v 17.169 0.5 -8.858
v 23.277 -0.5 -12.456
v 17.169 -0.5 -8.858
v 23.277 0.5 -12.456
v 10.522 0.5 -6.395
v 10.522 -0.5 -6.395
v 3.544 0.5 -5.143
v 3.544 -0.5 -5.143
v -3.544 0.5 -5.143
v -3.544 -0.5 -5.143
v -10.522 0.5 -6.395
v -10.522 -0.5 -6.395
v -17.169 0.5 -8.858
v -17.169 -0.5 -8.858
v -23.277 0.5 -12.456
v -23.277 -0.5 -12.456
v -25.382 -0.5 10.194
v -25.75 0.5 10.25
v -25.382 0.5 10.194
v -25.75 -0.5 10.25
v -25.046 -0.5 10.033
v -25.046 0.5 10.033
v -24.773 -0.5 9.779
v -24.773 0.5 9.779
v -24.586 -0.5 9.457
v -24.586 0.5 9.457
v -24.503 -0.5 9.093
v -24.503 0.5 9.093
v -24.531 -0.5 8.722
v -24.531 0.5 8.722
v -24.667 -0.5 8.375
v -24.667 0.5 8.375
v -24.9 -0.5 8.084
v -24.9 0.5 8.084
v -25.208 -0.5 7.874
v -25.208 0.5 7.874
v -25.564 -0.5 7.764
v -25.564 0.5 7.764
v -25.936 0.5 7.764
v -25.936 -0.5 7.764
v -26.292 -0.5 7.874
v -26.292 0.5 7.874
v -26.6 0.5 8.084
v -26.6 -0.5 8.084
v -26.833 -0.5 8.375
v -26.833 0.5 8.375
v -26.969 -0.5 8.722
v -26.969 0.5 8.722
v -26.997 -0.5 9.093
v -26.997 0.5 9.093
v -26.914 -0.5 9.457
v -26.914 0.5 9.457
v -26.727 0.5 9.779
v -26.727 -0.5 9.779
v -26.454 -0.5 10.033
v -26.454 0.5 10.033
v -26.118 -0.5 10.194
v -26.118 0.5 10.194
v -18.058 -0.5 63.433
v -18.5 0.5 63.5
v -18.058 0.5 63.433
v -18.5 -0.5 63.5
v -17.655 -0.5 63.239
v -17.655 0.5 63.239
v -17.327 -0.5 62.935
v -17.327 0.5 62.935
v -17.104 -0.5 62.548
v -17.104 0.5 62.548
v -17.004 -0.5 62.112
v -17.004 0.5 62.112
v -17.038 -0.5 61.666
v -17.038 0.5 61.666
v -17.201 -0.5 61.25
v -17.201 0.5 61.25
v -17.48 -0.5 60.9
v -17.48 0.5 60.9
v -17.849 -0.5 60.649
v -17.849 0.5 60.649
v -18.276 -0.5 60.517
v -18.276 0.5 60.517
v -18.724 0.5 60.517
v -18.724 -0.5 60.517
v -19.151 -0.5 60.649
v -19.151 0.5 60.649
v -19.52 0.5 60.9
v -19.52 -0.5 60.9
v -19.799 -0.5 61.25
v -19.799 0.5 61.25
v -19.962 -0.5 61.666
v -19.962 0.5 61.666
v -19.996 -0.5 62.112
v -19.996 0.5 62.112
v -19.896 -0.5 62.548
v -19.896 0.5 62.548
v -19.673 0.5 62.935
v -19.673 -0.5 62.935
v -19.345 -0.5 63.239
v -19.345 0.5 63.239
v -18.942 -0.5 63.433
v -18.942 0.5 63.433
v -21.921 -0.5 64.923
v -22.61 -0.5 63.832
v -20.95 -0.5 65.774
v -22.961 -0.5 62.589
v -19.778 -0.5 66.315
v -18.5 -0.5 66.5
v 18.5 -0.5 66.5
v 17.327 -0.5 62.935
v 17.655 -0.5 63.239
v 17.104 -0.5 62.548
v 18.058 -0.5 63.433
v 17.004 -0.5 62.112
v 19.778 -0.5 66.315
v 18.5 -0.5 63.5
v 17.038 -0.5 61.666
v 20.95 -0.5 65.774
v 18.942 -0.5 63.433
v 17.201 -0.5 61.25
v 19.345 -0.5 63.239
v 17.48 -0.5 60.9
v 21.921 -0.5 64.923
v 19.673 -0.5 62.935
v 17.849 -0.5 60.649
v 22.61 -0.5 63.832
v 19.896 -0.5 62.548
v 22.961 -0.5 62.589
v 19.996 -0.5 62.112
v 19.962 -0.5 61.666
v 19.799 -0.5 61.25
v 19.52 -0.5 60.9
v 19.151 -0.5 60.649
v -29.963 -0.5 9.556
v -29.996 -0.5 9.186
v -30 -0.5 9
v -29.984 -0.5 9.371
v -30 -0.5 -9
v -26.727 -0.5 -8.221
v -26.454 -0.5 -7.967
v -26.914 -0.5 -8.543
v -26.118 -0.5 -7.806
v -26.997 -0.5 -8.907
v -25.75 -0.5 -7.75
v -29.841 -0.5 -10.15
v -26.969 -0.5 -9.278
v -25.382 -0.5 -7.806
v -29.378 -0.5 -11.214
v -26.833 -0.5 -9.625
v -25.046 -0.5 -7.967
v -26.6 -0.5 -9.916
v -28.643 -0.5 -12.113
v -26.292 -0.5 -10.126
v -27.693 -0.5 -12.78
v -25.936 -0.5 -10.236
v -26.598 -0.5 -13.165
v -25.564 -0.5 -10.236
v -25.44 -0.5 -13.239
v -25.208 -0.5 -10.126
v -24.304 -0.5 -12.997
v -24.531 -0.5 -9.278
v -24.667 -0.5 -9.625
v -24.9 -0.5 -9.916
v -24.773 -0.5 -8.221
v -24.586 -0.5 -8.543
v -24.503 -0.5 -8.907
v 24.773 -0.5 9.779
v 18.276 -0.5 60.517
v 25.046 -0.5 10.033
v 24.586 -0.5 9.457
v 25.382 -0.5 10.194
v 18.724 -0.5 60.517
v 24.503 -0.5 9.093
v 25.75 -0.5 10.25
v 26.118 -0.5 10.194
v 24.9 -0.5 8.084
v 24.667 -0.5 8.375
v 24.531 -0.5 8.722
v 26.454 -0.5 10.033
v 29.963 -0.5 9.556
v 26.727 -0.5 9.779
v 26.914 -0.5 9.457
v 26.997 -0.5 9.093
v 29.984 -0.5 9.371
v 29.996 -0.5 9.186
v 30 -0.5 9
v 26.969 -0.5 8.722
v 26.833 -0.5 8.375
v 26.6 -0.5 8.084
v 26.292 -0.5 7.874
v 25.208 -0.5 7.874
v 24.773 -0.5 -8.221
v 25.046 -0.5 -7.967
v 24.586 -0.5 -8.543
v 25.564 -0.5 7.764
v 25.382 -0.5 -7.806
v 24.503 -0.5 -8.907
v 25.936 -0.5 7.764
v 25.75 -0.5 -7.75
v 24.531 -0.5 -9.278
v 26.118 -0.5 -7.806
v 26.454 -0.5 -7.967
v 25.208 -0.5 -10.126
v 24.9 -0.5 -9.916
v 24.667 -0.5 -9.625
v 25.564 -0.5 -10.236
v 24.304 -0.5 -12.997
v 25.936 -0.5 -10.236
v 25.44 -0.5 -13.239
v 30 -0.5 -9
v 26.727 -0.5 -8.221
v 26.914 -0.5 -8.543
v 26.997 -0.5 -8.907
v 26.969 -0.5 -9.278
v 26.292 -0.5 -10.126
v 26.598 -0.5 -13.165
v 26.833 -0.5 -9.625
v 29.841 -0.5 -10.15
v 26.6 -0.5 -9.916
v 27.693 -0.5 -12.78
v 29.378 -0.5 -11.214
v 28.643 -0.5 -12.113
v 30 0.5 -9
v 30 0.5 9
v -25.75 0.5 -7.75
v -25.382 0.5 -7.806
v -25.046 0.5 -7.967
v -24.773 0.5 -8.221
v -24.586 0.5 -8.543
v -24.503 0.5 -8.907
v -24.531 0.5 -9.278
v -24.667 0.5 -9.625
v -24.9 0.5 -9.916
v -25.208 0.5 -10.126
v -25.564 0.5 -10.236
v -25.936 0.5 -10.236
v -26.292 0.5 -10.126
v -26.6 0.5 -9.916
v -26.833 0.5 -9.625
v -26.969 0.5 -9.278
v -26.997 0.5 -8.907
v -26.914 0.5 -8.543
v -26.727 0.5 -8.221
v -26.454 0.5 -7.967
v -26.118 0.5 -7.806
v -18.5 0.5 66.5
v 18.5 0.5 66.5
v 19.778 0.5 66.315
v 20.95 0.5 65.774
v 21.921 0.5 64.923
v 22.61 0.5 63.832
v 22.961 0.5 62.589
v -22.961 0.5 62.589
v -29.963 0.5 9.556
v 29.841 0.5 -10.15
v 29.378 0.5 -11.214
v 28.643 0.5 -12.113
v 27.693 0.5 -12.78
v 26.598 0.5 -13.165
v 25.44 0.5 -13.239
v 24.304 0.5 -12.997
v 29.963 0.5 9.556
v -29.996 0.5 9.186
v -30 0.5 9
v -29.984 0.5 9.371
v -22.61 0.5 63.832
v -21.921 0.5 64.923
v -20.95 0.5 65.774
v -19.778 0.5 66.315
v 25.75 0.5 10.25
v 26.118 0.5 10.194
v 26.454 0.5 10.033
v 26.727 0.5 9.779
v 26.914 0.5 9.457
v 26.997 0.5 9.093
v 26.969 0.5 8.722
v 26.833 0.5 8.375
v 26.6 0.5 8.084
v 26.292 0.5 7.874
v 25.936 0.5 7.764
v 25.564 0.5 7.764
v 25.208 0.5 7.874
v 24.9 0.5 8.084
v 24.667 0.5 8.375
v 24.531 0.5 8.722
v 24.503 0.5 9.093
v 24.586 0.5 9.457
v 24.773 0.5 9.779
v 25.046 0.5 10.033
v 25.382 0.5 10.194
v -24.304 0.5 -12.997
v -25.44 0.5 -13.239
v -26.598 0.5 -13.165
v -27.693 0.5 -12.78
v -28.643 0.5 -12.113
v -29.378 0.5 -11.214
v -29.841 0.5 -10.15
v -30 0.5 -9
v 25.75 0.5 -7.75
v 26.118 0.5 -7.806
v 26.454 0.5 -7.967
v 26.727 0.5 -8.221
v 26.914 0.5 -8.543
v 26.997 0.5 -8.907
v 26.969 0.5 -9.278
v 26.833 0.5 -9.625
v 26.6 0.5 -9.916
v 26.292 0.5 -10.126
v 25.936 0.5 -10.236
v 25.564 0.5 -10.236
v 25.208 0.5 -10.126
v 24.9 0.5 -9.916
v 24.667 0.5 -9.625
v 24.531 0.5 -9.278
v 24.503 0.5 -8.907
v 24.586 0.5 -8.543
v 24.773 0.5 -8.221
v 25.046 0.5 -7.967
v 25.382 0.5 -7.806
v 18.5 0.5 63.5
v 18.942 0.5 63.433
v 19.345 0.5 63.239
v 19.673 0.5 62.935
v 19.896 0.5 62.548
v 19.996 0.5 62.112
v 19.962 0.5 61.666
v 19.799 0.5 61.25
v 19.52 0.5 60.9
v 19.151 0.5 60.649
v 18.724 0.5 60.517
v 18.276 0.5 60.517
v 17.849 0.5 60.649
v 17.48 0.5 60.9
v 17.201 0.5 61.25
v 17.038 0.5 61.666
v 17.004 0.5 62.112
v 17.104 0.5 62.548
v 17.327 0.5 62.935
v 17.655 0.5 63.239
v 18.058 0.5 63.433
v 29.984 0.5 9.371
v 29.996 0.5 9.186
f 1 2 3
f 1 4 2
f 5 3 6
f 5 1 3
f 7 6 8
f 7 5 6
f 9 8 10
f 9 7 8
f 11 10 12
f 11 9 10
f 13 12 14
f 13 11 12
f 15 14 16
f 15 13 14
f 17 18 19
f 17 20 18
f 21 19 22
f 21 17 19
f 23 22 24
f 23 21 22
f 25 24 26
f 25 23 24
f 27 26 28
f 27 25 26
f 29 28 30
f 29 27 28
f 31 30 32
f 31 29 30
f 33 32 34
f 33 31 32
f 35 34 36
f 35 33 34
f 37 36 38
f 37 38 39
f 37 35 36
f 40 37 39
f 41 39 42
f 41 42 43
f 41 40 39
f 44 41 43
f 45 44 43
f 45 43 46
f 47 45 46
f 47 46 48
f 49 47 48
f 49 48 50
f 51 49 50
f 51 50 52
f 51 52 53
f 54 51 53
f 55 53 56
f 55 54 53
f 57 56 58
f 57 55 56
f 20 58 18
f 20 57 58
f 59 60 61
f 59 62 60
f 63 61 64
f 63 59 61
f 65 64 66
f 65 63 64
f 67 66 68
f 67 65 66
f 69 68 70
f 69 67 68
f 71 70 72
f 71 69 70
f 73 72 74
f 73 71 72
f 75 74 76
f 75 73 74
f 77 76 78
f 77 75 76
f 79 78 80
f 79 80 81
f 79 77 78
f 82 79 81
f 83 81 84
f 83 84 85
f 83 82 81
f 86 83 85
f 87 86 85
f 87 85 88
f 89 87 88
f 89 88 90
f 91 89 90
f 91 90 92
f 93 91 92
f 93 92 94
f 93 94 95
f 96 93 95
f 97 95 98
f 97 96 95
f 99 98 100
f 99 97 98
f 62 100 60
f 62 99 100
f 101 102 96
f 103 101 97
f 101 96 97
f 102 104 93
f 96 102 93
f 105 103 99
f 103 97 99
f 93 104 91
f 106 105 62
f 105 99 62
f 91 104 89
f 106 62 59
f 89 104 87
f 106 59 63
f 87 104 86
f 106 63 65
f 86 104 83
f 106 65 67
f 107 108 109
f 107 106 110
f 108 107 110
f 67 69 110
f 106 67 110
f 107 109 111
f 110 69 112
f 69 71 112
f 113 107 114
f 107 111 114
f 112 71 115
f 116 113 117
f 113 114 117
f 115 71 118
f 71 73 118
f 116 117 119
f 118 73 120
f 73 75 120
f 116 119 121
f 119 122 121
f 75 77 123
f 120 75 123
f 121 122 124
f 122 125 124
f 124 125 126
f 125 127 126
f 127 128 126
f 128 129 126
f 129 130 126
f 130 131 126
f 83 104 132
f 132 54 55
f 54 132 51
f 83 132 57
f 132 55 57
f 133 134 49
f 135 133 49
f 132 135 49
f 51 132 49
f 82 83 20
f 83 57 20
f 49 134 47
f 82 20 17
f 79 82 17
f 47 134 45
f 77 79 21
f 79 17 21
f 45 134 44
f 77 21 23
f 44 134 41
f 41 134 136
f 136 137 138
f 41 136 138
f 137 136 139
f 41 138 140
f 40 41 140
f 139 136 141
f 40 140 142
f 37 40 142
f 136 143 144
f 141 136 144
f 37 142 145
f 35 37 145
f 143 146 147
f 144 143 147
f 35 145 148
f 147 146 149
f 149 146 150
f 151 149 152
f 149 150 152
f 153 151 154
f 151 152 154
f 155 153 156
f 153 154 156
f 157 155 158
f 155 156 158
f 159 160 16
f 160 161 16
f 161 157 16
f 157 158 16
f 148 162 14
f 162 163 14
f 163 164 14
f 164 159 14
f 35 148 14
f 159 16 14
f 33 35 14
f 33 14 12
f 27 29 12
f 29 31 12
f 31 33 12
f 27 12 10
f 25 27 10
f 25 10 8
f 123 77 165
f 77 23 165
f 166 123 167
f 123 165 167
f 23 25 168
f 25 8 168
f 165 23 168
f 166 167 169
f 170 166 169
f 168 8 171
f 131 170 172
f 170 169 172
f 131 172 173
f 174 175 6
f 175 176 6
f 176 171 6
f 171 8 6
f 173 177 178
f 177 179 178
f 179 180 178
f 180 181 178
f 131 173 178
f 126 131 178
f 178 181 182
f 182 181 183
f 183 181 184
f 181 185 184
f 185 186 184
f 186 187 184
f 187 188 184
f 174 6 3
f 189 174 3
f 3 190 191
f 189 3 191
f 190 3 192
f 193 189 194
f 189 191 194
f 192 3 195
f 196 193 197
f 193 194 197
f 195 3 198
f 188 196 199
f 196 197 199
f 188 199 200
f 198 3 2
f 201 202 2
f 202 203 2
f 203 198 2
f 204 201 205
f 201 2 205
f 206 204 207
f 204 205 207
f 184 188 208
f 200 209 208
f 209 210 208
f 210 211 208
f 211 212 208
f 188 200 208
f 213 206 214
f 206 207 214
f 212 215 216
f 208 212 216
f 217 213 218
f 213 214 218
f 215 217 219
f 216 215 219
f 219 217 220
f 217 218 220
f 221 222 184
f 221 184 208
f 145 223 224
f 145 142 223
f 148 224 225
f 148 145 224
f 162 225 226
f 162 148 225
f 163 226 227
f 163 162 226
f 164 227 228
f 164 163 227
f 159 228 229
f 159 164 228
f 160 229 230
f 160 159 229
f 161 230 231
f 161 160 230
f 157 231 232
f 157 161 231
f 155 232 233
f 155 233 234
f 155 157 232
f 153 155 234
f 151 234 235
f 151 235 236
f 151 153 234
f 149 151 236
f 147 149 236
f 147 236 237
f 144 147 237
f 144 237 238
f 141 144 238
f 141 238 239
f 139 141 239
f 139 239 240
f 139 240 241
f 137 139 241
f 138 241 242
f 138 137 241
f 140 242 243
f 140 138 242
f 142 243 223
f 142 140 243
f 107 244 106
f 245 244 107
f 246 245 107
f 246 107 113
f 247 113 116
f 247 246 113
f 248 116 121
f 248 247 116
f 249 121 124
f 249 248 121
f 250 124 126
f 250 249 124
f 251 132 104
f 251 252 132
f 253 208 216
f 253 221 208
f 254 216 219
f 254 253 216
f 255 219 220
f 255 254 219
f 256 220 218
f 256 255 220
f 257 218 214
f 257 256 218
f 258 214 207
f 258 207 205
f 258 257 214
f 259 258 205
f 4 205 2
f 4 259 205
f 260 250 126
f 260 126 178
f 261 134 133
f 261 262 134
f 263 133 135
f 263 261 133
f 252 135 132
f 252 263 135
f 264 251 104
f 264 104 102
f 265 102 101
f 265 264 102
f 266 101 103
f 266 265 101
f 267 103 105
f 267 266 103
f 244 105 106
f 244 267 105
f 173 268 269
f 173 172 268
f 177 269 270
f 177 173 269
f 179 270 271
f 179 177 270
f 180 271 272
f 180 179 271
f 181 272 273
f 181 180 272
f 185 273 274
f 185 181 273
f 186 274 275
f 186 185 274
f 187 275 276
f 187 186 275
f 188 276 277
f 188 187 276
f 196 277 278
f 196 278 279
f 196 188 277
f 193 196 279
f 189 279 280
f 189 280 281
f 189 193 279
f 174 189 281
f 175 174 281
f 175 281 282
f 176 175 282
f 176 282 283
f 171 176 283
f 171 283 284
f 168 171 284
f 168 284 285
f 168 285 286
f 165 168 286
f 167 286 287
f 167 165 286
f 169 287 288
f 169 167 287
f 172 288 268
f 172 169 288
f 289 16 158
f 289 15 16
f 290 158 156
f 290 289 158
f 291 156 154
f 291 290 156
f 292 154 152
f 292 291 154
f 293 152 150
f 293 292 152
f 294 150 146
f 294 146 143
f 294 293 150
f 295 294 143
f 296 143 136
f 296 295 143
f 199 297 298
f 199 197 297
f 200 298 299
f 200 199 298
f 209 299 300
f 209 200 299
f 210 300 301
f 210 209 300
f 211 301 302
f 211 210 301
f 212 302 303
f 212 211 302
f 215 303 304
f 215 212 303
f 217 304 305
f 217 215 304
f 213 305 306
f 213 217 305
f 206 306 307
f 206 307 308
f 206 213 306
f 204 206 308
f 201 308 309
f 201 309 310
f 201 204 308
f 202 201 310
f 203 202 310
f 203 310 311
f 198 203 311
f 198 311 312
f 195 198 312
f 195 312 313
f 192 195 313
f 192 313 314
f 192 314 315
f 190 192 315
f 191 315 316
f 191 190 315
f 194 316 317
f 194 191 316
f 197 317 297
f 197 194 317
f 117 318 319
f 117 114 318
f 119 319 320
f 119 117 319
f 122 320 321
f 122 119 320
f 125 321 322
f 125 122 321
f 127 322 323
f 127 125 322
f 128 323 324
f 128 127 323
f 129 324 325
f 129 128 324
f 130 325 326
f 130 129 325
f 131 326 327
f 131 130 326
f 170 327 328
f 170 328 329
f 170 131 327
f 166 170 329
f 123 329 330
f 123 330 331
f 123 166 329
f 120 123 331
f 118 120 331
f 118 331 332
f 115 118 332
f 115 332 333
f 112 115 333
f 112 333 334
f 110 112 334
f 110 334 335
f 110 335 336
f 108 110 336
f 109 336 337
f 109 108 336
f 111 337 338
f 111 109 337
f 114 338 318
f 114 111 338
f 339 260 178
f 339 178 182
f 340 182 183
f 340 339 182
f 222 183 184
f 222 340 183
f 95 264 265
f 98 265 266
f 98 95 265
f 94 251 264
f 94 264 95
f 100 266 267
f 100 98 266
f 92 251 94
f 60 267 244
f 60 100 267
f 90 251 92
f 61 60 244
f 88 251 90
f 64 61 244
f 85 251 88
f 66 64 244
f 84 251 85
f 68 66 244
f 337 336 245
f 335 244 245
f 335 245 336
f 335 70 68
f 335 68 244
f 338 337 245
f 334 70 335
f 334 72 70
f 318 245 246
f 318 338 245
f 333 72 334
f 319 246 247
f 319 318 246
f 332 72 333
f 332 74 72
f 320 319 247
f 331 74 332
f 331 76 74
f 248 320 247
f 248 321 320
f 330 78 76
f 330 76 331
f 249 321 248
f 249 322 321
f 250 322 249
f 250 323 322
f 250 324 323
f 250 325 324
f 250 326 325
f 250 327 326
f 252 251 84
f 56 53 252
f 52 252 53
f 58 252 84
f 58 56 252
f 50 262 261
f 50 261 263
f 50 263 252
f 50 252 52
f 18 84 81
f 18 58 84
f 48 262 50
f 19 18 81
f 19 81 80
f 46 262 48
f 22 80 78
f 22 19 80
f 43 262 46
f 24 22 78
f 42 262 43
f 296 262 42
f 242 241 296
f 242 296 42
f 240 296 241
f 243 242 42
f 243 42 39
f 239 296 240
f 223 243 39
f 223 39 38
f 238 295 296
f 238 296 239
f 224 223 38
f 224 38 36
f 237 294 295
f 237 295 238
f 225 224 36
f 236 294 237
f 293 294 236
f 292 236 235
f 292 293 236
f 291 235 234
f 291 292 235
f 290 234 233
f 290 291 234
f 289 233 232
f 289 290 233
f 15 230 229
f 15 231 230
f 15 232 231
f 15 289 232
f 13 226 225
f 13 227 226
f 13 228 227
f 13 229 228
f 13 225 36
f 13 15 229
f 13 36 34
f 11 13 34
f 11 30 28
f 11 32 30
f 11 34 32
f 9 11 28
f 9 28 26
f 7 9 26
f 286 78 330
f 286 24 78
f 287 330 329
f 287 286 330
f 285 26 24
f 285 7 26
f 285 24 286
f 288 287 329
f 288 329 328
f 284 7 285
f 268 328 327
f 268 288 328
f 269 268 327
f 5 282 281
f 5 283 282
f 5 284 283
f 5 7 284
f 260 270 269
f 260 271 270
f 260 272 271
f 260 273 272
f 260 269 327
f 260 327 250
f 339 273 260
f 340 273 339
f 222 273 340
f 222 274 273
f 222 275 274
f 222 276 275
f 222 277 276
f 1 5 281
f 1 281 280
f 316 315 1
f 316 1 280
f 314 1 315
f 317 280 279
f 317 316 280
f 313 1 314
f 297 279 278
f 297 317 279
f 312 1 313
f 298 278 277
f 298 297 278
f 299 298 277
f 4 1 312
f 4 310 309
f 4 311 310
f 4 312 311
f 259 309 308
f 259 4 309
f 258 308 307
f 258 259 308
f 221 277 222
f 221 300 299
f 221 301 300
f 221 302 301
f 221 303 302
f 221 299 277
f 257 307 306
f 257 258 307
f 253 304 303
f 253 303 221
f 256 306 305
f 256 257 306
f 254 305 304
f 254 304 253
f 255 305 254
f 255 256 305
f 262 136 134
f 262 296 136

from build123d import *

# Parameters (mm, degrees)
SKICA1_R                = 1.25
SKICA1_R_2              = 1.5
P_IDAT_VYSUNUT_M1_DEPTH = 0.5


with BuildPart() as part:
    # Skica1 → Přidat vysunutím1 (new, symmetric)
    with BuildSketch(Plane(origin=(0, 0, 0), x_dir=(1, 0, 0), z_dir=(0, 1, 0))):
        with BuildLine():
            Line((-29.963432056, -9.556318536), (-22.961281, -62.589043156))
            ThreePointArc((-22.961281, -62.589043156), (-21.466420891, -65.383836152), (-18.5, -66.5))
            Line((-18.5, -66.5), (18.5, -66.5))
            ThreePointArc((18.5, -66.5), (21.466420891, -65.383836152), (22.961281, -62.589043156))
            Line((22.961281, -62.589043156), (29.963432056, -9.556318536))
            ThreePointArc((29.963432056, -9.556318536), (29.99084816, -9.278759542), (30, -9))
            Line((30, -9), (30, 9))
            ThreePointArc((30, 9), (27.693135825, 12.77977819), (23.276836158, 12.4562929))
            ThreePointArc((23.276836158, 12.4562929), (0, 4.986108431), (-23.276836158, 12.4562929))
            ThreePointArc((-23.276836158, 12.4562929), (-27.693135825, 12.77977819), (-30, 9))
            Line((-30, 9), (-30, -9))
            ThreePointArc((-30, -9), (-29.99084816, -9.278759542), (-29.963432056, -9.556318536))
        make_face()
        with Locations(Location((-25.75, 9, 0), (0, 0, 270))):
            Circle(SKICA1_R, mode=Mode.SUBTRACT)
        with Locations(Location((25.75, 9, 0), (0, 0, 270))):
            Circle(SKICA1_R, mode=Mode.SUBTRACT)
        with Locations(Location((-25.75, -9, 0), (0, 0, 270))):
            Circle(SKICA1_R, mode=Mode.SUBTRACT)
        with Locations(Location((25.75, -9, 0), (0, 0, 270))):
            Circle(SKICA1_R, mode=Mode.SUBTRACT)
        with Locations(Location((-18.5, -62, 0), (0, 0, 270))):
            Circle(SKICA1_R_2, mode=Mode.SUBTRACT)
        with Locations(Location((18.5, -62, 0), (0, 0, 270))):
            Circle(SKICA1_R_2, mode=Mode.SUBTRACT)
    extrude(amount=P_IDAT_VYSUNUT_M1_DEPTH, both=True)


solid = part.part
